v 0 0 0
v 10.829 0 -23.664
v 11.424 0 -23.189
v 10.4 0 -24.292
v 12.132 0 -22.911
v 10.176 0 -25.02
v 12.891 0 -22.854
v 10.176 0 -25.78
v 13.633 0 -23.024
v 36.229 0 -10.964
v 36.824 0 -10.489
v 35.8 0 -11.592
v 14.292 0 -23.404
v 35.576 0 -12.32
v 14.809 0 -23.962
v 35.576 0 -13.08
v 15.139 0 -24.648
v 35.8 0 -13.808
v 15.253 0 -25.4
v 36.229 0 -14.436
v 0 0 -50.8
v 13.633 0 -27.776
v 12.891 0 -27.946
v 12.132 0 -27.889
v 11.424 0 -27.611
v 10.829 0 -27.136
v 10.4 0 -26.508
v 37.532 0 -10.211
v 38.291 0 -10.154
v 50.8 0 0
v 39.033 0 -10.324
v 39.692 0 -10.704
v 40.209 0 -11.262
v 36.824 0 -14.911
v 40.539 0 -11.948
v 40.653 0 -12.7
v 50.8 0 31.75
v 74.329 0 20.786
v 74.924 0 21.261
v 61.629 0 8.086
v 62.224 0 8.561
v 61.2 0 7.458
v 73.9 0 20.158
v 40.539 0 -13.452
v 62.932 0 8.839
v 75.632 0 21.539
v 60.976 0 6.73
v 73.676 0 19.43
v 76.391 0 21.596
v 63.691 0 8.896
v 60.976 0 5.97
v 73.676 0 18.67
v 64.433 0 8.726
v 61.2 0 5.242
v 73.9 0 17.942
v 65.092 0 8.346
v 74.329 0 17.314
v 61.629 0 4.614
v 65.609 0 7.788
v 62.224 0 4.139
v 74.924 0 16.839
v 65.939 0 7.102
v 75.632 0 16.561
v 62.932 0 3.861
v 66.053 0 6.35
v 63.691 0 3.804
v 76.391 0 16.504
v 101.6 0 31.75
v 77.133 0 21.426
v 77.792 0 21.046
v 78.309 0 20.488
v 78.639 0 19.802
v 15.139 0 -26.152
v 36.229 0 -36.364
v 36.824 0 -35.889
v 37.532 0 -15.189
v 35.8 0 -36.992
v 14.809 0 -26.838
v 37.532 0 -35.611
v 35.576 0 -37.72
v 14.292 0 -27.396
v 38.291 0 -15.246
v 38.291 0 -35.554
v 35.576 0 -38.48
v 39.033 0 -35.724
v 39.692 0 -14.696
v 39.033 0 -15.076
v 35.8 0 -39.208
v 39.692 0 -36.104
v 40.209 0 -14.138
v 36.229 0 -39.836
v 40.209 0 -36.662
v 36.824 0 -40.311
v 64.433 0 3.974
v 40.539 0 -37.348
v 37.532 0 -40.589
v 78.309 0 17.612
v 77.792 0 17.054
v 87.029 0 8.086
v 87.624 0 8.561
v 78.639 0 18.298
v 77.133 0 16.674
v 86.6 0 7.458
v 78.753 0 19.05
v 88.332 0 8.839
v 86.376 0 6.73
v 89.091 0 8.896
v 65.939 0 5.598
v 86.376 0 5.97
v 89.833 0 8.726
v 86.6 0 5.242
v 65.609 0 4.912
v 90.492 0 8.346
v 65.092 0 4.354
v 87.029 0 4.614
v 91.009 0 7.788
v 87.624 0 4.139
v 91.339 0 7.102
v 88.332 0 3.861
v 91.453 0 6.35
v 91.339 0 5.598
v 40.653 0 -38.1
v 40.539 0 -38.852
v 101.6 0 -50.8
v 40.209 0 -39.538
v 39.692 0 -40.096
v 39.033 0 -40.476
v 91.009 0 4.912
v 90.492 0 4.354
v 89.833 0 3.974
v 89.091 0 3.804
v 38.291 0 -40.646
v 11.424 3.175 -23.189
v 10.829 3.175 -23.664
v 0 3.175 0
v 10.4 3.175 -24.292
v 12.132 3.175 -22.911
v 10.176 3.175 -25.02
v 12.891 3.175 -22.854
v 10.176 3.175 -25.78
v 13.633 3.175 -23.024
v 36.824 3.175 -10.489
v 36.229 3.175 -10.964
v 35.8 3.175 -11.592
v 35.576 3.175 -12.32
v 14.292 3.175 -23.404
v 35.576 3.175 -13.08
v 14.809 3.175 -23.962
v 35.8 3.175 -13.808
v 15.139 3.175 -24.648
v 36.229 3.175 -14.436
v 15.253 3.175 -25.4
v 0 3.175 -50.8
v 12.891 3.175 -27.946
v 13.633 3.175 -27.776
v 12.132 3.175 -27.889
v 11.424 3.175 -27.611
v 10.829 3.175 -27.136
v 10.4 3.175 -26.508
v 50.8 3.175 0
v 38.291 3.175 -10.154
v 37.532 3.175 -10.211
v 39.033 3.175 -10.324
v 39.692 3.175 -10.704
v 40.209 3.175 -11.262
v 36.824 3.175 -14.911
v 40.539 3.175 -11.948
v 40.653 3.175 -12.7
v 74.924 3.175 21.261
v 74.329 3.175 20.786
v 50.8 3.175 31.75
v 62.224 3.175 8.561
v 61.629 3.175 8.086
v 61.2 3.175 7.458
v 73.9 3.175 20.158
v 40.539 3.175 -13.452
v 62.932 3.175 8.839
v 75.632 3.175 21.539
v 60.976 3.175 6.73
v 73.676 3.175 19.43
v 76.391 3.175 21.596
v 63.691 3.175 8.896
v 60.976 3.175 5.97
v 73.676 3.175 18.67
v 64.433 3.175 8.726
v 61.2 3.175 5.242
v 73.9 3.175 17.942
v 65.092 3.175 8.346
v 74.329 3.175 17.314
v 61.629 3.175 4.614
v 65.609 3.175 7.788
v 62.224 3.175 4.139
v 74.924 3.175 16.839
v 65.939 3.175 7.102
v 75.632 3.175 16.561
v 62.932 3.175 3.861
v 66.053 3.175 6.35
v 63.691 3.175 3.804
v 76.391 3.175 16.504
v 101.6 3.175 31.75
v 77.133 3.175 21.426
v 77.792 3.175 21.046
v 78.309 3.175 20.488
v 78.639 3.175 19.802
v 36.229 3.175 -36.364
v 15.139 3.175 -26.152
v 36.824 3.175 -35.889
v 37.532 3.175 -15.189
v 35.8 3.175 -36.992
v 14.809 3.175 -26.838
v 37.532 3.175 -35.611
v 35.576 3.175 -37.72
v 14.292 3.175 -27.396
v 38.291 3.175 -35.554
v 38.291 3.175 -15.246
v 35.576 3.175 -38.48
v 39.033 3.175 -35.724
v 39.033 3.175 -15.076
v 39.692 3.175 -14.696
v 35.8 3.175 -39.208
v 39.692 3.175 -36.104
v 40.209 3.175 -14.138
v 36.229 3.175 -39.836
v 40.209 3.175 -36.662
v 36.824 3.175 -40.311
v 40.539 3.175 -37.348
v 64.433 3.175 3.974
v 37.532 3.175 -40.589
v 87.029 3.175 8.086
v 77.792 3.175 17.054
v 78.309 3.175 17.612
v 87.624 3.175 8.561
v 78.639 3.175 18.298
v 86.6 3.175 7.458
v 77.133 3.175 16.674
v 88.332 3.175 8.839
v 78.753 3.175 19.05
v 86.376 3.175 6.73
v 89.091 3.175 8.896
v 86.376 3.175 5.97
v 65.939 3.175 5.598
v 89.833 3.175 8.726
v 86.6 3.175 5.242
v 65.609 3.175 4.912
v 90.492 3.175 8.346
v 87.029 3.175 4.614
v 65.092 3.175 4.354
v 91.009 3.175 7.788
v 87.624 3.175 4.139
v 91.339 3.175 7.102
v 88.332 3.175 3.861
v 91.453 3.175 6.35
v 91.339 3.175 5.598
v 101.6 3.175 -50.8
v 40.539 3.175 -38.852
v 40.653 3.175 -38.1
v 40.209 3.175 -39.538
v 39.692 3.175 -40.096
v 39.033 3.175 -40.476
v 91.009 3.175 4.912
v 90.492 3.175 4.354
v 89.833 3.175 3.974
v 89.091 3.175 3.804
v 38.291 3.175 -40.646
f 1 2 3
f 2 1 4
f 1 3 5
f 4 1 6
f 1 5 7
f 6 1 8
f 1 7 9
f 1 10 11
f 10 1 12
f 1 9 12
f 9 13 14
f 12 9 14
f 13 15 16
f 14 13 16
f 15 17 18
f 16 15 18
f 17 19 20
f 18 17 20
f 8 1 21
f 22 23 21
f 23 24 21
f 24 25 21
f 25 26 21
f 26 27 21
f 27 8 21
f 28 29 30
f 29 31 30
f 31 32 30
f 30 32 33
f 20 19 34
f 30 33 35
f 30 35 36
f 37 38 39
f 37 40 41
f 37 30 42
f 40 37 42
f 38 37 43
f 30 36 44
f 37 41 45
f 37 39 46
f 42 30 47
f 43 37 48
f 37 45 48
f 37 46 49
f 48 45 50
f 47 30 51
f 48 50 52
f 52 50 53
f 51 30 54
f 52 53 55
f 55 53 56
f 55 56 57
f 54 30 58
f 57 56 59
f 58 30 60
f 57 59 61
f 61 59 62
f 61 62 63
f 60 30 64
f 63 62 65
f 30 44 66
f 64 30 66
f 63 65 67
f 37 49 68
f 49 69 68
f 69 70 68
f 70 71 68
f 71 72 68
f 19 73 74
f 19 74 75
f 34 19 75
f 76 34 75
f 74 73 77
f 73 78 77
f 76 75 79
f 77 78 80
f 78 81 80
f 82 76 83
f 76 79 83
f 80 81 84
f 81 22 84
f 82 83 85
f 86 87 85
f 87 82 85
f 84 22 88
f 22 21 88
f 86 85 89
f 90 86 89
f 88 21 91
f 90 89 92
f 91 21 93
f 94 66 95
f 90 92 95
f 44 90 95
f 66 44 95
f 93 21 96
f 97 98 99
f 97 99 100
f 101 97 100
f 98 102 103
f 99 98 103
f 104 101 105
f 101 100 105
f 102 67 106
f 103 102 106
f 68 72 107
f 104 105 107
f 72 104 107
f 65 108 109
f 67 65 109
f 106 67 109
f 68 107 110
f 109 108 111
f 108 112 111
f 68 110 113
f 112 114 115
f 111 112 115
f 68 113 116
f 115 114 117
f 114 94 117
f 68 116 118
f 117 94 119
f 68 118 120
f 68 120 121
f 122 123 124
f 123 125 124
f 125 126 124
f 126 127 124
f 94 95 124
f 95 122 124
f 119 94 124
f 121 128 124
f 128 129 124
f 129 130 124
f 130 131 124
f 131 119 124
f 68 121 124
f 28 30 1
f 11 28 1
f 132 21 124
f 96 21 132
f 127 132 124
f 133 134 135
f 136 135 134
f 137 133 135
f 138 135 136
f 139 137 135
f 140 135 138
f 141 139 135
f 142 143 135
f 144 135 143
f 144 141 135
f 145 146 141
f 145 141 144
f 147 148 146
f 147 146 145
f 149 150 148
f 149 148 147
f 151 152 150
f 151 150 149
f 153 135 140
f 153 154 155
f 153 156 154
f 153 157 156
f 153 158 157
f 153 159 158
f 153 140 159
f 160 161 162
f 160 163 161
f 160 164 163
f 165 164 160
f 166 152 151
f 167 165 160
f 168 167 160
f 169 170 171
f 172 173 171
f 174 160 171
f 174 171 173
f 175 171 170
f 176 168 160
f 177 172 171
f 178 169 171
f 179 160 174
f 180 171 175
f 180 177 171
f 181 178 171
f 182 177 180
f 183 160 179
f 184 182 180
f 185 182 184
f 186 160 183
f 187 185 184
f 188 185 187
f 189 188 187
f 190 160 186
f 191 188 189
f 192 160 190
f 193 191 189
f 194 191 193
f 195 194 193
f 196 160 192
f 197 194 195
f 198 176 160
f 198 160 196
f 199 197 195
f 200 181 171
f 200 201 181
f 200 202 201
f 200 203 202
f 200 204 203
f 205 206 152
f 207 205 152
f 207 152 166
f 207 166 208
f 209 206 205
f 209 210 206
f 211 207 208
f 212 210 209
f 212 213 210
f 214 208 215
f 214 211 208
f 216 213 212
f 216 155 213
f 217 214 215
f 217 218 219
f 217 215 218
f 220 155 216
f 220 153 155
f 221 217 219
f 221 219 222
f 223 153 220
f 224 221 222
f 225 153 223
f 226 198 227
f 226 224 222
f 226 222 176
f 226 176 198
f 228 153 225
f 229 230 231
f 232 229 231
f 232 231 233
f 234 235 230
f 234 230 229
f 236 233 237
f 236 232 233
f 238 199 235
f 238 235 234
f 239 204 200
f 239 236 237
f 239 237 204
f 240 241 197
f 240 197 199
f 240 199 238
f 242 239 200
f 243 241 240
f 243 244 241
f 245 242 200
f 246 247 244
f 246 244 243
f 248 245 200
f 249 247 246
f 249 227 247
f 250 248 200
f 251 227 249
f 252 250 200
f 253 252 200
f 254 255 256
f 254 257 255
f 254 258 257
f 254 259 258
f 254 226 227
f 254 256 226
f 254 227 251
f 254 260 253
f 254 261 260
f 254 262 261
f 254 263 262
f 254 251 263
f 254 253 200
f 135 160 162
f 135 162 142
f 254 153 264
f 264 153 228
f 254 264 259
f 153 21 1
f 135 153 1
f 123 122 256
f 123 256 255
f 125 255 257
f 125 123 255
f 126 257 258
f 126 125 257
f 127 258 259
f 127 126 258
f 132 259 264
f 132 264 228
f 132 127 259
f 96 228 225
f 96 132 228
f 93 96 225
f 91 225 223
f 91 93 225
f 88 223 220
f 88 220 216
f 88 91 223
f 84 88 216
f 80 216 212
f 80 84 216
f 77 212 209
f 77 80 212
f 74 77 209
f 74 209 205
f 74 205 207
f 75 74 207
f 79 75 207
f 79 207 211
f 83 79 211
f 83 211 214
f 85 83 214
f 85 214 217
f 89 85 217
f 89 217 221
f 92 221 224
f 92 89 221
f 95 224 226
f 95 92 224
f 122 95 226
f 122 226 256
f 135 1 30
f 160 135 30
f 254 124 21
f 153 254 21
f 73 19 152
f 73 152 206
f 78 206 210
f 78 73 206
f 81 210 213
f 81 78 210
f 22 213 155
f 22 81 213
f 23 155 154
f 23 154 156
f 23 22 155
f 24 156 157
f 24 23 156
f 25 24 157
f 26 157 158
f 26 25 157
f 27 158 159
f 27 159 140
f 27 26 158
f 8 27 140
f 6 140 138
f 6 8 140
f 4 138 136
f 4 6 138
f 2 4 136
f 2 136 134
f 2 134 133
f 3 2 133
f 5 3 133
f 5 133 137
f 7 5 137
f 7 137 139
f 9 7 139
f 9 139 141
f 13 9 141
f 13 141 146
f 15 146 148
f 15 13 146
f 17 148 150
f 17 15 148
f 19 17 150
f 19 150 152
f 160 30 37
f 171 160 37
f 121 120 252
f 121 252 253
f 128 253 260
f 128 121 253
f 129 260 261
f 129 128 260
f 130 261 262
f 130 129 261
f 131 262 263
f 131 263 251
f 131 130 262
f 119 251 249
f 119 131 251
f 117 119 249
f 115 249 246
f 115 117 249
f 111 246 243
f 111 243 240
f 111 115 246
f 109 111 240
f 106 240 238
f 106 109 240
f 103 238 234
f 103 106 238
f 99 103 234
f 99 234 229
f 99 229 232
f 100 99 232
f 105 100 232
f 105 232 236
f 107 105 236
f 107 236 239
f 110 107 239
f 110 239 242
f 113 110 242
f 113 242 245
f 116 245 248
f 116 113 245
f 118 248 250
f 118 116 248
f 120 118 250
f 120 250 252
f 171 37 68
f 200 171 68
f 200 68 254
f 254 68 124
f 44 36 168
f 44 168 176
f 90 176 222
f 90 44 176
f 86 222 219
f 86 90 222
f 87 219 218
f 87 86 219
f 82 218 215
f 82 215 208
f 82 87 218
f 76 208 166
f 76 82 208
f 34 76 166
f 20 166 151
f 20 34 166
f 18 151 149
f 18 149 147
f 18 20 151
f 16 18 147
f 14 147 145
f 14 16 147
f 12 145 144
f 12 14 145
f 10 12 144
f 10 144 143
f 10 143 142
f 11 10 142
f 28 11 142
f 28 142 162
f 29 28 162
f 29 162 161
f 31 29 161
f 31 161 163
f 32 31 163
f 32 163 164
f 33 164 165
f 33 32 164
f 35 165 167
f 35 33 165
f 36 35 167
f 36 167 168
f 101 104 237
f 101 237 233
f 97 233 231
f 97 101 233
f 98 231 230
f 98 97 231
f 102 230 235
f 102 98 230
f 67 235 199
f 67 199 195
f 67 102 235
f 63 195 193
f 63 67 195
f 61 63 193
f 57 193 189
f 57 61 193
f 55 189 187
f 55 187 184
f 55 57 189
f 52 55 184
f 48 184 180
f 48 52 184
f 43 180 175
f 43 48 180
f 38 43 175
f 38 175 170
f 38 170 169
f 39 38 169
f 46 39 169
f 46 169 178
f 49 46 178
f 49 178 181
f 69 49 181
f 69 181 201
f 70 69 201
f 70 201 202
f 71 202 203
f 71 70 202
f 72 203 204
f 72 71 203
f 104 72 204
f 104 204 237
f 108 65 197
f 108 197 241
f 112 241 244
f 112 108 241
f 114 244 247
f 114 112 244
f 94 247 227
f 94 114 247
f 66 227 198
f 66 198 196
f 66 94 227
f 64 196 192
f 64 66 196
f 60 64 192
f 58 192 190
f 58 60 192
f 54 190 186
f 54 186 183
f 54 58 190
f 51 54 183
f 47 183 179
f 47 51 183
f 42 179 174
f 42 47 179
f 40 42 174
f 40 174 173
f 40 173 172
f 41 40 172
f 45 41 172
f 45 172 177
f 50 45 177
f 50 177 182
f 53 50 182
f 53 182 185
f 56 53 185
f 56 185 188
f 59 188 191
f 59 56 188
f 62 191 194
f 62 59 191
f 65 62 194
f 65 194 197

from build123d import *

# Parameters (mm, degrees)
SKETCH1_R           = 2.5527
BOSS_EXTRUDE1_DEPTH = 3.175


with BuildPart() as part:
    # Sketch1 → Boss-Extrude1 (new body)
    with BuildSketch(Plane(origin=(0, 0, 0), x_dir=(1, 0, 0), z_dir=(0, 1, 0))):
        Polygon((0, 0), (50.8, 0), (50.8, -31.75), (101.6, -31.75), (101.6, 50.8), (0, 50.8), align=None)
        with Locations((12.7, 25.4)):
            Circle(SKETCH1_R, mode=Mode.SUBTRACT)
        with Locations((38.1, 12.7)):
            Circle(SKETCH1_R, mode=Mode.SUBTRACT)
        with Locations((38.1, 38.1)):
            Circle(SKETCH1_R, mode=Mode.SUBTRACT)
        with Locations((63.5, -6.35)):
            Circle(SKETCH1_R, mode=Mode.SUBTRACT)
        with Locations((88.9, -6.35)):
            Circle(SKETCH1_R, mode=Mode.SUBTRACT)
        with Locations((76.2, -19.05)):
            Circle(SKETCH1_R, mode=Mode.SUBTRACT)
    extrude(amount=BOSS_EXTRUDE1_DEPTH)


solid = part.part
